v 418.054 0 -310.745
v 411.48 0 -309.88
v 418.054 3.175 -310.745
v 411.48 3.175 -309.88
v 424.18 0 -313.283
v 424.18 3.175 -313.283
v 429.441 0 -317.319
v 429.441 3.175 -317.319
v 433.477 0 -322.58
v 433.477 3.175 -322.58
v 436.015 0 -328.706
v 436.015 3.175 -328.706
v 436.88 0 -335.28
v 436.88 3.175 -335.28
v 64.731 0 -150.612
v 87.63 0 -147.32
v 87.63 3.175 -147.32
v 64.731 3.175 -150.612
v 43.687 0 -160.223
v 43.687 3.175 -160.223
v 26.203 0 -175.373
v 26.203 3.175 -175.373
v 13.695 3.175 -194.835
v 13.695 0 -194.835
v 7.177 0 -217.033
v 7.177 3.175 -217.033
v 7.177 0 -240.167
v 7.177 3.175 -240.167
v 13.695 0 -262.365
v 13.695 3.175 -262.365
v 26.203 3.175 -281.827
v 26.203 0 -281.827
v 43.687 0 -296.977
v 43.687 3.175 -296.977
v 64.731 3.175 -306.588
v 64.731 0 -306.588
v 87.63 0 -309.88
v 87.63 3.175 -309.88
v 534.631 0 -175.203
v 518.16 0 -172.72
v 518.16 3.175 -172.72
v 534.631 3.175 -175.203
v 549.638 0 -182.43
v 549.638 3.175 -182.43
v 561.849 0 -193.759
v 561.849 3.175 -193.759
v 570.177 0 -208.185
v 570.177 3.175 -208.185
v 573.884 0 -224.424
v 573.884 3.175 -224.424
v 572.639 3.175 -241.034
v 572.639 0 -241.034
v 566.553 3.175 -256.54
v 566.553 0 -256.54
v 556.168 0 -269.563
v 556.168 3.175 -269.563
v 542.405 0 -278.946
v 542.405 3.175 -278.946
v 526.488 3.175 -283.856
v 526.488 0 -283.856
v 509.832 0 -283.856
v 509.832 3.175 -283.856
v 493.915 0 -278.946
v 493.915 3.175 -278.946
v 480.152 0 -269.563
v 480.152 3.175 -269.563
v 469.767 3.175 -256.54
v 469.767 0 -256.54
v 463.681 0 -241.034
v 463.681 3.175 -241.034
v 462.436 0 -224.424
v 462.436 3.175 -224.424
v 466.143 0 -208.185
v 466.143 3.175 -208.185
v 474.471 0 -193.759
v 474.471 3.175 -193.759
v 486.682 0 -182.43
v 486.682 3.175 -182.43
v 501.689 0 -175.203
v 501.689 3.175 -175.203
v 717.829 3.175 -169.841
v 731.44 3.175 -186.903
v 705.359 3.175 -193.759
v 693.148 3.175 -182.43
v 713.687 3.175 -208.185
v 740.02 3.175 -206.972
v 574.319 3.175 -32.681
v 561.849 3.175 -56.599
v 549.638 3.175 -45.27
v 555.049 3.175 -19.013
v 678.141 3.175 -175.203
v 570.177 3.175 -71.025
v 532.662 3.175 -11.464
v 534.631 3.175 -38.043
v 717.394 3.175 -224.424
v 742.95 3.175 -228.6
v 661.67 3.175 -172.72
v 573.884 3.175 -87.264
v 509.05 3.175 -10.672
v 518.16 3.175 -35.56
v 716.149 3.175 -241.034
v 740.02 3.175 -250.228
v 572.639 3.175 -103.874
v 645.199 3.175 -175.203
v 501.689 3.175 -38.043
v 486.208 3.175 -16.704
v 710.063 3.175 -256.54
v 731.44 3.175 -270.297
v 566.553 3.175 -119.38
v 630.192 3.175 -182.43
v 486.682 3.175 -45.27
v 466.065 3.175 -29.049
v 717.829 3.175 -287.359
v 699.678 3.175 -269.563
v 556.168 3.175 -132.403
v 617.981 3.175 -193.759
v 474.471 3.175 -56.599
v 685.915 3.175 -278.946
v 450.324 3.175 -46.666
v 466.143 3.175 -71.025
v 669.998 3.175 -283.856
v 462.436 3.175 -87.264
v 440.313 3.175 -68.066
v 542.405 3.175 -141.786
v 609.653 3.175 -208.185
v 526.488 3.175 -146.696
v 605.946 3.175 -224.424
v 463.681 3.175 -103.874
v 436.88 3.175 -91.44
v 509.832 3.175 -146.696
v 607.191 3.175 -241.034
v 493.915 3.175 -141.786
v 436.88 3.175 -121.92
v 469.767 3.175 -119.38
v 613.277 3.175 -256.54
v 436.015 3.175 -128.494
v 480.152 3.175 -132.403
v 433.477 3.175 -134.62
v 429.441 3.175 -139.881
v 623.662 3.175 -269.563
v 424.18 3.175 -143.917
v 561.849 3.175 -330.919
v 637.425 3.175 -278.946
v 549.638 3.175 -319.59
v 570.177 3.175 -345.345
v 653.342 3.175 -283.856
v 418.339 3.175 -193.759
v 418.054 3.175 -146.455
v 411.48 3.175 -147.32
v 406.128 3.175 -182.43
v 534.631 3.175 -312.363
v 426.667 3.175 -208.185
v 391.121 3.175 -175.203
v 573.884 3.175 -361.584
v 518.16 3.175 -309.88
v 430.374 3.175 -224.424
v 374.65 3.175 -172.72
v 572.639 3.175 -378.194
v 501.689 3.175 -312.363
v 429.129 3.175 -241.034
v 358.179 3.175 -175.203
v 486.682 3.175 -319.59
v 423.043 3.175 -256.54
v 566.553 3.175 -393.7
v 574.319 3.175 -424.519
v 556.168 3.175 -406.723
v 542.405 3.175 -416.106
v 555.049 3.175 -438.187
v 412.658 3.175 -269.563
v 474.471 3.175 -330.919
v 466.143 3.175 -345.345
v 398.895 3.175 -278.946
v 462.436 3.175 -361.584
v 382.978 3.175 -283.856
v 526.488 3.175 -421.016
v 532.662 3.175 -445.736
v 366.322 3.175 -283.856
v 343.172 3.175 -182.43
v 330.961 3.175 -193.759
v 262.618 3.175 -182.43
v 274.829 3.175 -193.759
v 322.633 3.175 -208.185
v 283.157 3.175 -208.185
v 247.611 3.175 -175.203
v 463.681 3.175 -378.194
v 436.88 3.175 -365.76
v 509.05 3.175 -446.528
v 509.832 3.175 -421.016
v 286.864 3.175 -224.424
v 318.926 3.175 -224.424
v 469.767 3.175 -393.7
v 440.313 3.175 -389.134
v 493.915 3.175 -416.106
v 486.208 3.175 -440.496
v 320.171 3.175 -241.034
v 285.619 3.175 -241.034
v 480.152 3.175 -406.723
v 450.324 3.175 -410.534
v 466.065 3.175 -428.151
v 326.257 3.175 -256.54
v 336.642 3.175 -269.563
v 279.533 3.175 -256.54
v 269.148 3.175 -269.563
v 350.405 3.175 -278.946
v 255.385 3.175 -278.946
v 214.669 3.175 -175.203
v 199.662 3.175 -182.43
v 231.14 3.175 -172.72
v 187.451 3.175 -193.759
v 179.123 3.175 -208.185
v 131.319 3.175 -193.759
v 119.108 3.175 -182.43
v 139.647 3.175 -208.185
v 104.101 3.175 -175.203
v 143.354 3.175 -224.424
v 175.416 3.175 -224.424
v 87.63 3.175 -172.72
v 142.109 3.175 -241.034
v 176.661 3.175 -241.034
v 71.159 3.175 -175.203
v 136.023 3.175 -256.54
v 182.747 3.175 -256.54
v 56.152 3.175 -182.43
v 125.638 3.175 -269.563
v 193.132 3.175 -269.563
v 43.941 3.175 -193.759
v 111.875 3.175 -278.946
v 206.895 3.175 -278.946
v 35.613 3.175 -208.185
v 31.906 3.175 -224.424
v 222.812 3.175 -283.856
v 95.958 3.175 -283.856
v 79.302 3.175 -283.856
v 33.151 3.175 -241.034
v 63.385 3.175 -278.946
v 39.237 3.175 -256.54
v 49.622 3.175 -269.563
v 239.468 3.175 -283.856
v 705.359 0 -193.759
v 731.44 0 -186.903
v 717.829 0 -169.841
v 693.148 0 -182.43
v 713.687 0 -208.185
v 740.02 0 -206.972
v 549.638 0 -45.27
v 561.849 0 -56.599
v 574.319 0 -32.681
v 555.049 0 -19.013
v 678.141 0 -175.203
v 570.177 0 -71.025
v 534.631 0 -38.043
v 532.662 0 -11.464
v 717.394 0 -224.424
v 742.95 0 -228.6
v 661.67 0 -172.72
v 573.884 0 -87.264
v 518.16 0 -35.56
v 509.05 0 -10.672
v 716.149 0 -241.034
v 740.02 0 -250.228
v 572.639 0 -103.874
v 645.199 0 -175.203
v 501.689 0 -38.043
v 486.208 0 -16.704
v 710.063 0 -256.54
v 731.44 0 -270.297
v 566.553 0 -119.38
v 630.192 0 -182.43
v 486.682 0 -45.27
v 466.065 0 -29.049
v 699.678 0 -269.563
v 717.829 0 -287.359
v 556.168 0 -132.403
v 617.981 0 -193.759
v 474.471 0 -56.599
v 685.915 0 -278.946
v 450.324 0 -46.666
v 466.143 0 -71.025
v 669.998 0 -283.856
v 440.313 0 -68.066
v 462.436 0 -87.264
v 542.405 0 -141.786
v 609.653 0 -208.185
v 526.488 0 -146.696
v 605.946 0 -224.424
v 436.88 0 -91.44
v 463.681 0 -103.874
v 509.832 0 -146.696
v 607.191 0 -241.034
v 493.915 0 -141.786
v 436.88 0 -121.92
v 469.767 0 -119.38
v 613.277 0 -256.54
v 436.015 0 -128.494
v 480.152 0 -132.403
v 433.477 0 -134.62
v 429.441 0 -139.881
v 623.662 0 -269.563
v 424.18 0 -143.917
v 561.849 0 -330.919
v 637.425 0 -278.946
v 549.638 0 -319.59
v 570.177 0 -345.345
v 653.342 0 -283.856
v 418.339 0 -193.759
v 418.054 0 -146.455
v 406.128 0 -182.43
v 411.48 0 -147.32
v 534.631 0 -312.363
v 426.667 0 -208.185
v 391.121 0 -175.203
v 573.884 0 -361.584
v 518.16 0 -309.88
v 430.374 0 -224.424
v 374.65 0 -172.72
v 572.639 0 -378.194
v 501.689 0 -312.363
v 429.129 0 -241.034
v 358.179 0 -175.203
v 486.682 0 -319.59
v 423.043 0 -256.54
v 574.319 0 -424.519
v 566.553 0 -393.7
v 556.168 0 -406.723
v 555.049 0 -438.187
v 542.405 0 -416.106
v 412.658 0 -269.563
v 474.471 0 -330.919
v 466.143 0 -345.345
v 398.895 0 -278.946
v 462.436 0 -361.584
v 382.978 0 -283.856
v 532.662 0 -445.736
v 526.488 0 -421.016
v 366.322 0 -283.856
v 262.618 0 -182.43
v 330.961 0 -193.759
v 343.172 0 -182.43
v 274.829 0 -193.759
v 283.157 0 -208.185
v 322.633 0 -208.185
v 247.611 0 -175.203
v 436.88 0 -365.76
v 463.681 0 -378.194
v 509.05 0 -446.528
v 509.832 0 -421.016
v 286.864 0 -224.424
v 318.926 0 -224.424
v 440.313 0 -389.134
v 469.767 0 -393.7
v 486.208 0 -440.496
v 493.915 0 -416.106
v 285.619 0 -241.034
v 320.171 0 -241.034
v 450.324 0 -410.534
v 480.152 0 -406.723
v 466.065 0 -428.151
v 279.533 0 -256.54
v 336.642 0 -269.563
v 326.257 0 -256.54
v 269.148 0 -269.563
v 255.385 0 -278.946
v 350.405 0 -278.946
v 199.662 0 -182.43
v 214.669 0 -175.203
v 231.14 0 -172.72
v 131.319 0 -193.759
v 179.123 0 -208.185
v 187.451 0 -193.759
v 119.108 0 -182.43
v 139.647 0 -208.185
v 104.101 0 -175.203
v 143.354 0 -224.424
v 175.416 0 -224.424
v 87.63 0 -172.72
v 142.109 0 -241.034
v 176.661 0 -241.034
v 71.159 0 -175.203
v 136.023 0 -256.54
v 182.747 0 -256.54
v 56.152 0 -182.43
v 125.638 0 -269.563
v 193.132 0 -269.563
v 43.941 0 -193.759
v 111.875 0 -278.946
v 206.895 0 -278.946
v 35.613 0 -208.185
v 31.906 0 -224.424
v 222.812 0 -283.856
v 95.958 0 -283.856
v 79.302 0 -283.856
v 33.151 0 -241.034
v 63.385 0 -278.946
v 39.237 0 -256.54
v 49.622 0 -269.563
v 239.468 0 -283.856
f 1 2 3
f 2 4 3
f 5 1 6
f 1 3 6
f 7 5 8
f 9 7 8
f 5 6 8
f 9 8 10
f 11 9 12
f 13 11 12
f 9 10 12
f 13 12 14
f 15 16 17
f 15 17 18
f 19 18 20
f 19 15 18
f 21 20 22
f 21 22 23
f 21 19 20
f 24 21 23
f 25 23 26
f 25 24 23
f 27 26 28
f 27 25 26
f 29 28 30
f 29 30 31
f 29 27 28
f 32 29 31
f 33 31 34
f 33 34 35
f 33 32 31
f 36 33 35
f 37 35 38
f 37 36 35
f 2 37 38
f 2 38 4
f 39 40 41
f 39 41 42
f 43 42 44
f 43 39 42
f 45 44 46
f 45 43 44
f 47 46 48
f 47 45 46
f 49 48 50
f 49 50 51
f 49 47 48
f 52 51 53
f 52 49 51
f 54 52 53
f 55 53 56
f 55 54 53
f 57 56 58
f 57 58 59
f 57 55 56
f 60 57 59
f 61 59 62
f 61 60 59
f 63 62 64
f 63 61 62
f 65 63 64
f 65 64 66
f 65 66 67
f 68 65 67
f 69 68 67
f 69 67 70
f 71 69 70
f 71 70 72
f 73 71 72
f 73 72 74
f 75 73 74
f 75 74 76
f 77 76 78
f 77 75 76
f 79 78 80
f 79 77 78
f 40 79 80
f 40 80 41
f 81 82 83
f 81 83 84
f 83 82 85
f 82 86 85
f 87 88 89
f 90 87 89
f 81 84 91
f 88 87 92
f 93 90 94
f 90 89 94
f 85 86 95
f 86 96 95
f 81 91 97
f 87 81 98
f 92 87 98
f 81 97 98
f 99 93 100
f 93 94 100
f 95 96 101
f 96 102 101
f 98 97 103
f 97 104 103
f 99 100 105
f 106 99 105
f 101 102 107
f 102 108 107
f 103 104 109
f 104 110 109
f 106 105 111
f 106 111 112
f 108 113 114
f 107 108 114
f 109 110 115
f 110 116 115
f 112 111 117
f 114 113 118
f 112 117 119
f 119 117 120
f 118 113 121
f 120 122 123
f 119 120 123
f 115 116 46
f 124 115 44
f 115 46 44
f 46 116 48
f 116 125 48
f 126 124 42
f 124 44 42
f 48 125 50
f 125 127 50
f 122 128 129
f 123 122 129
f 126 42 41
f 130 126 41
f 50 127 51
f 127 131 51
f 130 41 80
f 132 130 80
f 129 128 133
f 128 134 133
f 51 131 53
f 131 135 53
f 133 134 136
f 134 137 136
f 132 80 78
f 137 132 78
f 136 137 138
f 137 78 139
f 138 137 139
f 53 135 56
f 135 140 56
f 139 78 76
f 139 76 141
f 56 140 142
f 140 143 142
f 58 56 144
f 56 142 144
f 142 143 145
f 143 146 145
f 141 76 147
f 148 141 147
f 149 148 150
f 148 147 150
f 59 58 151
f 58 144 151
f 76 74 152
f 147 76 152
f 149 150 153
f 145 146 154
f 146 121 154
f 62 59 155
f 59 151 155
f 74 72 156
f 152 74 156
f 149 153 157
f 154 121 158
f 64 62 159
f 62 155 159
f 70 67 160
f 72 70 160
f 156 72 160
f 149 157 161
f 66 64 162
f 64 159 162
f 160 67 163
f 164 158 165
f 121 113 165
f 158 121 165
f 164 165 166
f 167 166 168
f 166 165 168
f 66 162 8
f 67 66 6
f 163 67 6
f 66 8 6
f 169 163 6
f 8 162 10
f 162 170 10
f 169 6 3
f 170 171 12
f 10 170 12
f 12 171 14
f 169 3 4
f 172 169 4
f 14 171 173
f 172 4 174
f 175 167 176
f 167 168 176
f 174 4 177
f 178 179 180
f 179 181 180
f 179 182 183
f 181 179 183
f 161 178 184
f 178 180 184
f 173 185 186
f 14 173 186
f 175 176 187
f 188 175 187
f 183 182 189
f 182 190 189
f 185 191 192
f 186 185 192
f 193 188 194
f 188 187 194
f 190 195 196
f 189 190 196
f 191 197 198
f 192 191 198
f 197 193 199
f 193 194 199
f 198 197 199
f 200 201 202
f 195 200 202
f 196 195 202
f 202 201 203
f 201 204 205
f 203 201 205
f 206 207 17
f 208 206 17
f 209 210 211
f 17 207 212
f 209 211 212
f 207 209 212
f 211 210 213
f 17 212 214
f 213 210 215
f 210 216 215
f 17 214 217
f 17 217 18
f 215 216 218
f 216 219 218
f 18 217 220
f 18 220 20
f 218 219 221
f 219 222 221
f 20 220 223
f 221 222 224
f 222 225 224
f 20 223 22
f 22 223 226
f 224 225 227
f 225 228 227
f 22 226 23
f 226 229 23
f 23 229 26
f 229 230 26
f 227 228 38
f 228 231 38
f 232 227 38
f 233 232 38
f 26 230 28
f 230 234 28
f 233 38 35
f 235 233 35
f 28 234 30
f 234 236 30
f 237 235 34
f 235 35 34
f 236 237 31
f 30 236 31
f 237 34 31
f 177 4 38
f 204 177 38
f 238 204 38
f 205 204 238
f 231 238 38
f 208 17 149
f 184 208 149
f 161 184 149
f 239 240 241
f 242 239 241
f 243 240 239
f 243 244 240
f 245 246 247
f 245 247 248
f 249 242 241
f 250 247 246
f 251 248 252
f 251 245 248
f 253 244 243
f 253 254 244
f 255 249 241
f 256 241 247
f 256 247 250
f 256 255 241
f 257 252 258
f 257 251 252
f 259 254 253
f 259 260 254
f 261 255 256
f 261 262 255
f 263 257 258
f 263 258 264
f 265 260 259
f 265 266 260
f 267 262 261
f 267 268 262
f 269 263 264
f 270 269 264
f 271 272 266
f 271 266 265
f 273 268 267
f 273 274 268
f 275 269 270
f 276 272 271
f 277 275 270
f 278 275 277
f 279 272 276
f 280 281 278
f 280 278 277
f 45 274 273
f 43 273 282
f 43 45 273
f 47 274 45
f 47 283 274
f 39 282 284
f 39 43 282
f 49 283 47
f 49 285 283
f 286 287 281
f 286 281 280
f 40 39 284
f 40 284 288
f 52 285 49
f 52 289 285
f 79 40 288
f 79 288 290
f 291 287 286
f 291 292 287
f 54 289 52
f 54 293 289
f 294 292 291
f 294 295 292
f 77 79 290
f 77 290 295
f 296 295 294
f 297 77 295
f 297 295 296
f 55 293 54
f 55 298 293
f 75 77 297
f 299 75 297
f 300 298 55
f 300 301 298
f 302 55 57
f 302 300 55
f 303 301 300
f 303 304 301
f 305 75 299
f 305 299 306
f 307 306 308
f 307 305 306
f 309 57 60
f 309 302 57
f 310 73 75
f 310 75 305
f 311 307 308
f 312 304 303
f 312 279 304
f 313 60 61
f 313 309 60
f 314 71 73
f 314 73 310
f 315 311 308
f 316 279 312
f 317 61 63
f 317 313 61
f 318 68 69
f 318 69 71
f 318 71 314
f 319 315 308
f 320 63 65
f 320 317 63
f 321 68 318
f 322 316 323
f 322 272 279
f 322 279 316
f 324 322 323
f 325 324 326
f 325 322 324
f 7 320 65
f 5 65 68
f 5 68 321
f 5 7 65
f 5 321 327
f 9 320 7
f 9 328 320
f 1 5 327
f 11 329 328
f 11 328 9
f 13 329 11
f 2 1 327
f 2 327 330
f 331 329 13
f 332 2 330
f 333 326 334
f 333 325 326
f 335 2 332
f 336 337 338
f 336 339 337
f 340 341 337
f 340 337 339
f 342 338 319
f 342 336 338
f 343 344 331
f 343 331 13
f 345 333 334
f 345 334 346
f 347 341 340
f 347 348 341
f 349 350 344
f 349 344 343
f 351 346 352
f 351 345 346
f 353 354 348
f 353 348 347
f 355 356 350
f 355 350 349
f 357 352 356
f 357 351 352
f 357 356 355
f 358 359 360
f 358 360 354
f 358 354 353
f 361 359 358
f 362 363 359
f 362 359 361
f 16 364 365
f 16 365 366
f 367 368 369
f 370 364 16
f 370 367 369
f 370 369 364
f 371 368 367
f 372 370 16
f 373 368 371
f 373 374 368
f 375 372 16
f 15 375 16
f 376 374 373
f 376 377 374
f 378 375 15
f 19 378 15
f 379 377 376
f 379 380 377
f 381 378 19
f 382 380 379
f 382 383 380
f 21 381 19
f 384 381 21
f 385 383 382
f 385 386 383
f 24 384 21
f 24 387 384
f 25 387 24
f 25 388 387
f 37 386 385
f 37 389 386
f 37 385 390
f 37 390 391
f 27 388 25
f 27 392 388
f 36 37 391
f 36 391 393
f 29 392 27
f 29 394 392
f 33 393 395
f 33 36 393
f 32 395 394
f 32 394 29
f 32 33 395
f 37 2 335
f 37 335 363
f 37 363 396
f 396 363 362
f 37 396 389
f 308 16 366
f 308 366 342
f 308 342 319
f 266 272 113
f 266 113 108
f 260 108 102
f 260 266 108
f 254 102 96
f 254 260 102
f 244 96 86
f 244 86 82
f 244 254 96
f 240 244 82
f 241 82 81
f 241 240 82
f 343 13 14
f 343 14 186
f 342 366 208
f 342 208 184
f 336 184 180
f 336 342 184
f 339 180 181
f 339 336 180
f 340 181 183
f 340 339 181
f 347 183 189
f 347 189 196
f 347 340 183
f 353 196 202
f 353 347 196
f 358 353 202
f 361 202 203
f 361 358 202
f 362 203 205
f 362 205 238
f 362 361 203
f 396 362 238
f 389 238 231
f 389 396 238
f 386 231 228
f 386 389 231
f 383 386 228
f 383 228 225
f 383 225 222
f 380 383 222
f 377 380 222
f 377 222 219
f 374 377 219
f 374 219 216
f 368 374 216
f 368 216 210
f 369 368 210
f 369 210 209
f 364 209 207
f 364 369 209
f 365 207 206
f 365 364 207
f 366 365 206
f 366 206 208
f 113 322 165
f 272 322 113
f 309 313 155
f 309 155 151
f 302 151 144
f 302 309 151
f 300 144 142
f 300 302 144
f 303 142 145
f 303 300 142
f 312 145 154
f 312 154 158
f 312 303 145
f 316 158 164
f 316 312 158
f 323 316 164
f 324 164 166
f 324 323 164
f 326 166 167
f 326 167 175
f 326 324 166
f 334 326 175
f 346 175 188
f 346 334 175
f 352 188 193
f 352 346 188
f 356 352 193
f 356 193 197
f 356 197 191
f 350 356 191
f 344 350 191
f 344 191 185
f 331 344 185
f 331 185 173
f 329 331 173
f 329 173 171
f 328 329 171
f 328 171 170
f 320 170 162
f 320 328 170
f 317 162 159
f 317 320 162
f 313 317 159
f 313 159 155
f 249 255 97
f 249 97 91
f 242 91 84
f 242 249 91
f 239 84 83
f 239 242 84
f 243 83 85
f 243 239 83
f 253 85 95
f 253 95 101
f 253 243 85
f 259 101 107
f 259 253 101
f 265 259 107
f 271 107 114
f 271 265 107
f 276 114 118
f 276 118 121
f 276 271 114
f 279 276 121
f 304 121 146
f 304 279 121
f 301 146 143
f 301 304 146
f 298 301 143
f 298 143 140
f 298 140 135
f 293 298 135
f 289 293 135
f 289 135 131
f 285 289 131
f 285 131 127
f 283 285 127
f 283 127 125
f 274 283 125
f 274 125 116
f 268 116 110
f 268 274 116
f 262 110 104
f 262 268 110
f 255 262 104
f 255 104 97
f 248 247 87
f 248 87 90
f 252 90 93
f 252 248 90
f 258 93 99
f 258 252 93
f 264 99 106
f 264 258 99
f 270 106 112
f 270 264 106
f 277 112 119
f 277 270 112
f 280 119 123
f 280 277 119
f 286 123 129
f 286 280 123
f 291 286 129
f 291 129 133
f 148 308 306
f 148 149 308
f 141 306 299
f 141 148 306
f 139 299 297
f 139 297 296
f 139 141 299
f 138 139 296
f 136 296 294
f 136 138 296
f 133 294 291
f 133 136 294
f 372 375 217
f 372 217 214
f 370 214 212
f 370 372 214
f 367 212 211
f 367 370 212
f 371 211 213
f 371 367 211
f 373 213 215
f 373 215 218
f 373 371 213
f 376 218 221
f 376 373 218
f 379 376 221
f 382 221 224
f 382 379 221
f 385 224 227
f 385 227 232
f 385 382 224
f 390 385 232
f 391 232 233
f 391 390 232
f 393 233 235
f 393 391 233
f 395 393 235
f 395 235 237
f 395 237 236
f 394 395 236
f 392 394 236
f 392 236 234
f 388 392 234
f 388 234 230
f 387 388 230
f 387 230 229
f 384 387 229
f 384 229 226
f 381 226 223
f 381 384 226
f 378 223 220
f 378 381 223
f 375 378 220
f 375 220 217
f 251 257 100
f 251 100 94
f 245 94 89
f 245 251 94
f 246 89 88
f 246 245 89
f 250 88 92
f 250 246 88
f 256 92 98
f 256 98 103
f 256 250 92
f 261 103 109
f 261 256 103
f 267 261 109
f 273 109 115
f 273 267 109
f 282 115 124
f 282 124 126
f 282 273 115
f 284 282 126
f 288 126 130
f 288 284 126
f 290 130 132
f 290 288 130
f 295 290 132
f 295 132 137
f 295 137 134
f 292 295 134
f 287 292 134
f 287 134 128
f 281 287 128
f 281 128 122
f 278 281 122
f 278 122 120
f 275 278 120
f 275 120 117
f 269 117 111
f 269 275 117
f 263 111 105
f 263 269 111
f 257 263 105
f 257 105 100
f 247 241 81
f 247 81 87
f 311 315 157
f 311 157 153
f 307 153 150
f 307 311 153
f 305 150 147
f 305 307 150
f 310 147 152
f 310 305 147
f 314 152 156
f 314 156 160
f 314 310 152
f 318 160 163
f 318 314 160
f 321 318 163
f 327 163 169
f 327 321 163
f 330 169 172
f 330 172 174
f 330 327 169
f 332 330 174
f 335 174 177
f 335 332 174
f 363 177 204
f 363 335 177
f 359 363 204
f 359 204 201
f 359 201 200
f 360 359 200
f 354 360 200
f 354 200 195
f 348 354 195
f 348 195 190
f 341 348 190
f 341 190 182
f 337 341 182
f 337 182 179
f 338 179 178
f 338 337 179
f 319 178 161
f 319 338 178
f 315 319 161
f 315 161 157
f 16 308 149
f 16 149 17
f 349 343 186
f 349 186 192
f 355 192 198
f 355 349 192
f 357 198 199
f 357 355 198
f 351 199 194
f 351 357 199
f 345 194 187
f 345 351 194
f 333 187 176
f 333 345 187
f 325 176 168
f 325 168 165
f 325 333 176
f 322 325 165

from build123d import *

# Parameters (mm, degrees)
SKETCH1_R           = 55.88
BOSS_EXTRUDE1_DEPTH = 3.175
FILLET1_R           = 25.4


with BuildPart() as part:
    # Sketch1 → Boss-Extrude1 (new body)
    with BuildSketch(Plane(origin=(0, 0, 0), x_dir=(1, 0, 0), z_dir=(0, 1, 0))):
        with BuildLine():
            Line((87.63, 309.88), (436.88, 309.88))
            Line((436.88, 309.88), (436.88, 365.76))
            ThreePointArc((436.88, 365.76), (486.208175566, 440.496331963), (574.318959531, 424.518911361))
            Line((574.318959531, 424.518911361), (717.828959531, 287.358911361))
            ThreePointArc((717.828959531, 287.358911361), (742.95, 228.6), (717.828959531, 169.841088639))
            Line((717.828959531, 169.841088639), (574.318959531, 32.681088639))
            ThreePointArc((574.318959531, 32.681088639), (486.208175566, 16.703668037), (436.88, 91.44))
            Line((436.88, 91.44), (436.88, 147.32))
            Line((436.88, 147.32), (87.63, 147.32))
            ThreePointArc((87.63, 147.32), (6.35, 228.6), (87.63, 309.88))
        make_face()
        with Locations(Location((87.63, 228.6, 0), (0, 0, 270))):
            Circle(SKETCH1_R, mode=Mode.SUBTRACT)
        with Locations(Location((231.14, 228.6, 0), (0, 0, 270))):
            Circle(SKETCH1_R, mode=Mode.SUBTRACT)
        with Locations(Location((374.65, 228.6, 0), (0, 0, 270))):
            Circle(SKETCH1_R, mode=Mode.SUBTRACT)
        with Locations(Location((518.16, 228.6, 0), (0, 0, 270))):
            Circle(SKETCH1_R, mode=Mode.SUBTRACT)
        with Locations(Location((661.67, 228.6, 0), (0, 0, 270))):
            Circle(SKETCH1_R, mode=Mode.SUBTRACT)
        with Locations(Location((518.16, 365.76, 0), (0, 0, 270))):
            Circle(SKETCH1_R, mode=Mode.SUBTRACT)
        with Locations(Location((518.16, 91.44, 0), (0, 0, 270))):
            Circle(SKETCH1_R, mode=Mode.SUBTRACT)
    extrude(amount=BOSS_EXTRUDE1_DEPTH)

    # Fillet1
    fillet1_edges = [part.edges().sort_by_distance(p)[0] for p in [
        (436.88, 1.5875, -147.32),
        (436.88, 1.5875, -309.88),
    ]]
    fillet(fillet1_edges, radius=FILLET1_R)


solid = part.part
